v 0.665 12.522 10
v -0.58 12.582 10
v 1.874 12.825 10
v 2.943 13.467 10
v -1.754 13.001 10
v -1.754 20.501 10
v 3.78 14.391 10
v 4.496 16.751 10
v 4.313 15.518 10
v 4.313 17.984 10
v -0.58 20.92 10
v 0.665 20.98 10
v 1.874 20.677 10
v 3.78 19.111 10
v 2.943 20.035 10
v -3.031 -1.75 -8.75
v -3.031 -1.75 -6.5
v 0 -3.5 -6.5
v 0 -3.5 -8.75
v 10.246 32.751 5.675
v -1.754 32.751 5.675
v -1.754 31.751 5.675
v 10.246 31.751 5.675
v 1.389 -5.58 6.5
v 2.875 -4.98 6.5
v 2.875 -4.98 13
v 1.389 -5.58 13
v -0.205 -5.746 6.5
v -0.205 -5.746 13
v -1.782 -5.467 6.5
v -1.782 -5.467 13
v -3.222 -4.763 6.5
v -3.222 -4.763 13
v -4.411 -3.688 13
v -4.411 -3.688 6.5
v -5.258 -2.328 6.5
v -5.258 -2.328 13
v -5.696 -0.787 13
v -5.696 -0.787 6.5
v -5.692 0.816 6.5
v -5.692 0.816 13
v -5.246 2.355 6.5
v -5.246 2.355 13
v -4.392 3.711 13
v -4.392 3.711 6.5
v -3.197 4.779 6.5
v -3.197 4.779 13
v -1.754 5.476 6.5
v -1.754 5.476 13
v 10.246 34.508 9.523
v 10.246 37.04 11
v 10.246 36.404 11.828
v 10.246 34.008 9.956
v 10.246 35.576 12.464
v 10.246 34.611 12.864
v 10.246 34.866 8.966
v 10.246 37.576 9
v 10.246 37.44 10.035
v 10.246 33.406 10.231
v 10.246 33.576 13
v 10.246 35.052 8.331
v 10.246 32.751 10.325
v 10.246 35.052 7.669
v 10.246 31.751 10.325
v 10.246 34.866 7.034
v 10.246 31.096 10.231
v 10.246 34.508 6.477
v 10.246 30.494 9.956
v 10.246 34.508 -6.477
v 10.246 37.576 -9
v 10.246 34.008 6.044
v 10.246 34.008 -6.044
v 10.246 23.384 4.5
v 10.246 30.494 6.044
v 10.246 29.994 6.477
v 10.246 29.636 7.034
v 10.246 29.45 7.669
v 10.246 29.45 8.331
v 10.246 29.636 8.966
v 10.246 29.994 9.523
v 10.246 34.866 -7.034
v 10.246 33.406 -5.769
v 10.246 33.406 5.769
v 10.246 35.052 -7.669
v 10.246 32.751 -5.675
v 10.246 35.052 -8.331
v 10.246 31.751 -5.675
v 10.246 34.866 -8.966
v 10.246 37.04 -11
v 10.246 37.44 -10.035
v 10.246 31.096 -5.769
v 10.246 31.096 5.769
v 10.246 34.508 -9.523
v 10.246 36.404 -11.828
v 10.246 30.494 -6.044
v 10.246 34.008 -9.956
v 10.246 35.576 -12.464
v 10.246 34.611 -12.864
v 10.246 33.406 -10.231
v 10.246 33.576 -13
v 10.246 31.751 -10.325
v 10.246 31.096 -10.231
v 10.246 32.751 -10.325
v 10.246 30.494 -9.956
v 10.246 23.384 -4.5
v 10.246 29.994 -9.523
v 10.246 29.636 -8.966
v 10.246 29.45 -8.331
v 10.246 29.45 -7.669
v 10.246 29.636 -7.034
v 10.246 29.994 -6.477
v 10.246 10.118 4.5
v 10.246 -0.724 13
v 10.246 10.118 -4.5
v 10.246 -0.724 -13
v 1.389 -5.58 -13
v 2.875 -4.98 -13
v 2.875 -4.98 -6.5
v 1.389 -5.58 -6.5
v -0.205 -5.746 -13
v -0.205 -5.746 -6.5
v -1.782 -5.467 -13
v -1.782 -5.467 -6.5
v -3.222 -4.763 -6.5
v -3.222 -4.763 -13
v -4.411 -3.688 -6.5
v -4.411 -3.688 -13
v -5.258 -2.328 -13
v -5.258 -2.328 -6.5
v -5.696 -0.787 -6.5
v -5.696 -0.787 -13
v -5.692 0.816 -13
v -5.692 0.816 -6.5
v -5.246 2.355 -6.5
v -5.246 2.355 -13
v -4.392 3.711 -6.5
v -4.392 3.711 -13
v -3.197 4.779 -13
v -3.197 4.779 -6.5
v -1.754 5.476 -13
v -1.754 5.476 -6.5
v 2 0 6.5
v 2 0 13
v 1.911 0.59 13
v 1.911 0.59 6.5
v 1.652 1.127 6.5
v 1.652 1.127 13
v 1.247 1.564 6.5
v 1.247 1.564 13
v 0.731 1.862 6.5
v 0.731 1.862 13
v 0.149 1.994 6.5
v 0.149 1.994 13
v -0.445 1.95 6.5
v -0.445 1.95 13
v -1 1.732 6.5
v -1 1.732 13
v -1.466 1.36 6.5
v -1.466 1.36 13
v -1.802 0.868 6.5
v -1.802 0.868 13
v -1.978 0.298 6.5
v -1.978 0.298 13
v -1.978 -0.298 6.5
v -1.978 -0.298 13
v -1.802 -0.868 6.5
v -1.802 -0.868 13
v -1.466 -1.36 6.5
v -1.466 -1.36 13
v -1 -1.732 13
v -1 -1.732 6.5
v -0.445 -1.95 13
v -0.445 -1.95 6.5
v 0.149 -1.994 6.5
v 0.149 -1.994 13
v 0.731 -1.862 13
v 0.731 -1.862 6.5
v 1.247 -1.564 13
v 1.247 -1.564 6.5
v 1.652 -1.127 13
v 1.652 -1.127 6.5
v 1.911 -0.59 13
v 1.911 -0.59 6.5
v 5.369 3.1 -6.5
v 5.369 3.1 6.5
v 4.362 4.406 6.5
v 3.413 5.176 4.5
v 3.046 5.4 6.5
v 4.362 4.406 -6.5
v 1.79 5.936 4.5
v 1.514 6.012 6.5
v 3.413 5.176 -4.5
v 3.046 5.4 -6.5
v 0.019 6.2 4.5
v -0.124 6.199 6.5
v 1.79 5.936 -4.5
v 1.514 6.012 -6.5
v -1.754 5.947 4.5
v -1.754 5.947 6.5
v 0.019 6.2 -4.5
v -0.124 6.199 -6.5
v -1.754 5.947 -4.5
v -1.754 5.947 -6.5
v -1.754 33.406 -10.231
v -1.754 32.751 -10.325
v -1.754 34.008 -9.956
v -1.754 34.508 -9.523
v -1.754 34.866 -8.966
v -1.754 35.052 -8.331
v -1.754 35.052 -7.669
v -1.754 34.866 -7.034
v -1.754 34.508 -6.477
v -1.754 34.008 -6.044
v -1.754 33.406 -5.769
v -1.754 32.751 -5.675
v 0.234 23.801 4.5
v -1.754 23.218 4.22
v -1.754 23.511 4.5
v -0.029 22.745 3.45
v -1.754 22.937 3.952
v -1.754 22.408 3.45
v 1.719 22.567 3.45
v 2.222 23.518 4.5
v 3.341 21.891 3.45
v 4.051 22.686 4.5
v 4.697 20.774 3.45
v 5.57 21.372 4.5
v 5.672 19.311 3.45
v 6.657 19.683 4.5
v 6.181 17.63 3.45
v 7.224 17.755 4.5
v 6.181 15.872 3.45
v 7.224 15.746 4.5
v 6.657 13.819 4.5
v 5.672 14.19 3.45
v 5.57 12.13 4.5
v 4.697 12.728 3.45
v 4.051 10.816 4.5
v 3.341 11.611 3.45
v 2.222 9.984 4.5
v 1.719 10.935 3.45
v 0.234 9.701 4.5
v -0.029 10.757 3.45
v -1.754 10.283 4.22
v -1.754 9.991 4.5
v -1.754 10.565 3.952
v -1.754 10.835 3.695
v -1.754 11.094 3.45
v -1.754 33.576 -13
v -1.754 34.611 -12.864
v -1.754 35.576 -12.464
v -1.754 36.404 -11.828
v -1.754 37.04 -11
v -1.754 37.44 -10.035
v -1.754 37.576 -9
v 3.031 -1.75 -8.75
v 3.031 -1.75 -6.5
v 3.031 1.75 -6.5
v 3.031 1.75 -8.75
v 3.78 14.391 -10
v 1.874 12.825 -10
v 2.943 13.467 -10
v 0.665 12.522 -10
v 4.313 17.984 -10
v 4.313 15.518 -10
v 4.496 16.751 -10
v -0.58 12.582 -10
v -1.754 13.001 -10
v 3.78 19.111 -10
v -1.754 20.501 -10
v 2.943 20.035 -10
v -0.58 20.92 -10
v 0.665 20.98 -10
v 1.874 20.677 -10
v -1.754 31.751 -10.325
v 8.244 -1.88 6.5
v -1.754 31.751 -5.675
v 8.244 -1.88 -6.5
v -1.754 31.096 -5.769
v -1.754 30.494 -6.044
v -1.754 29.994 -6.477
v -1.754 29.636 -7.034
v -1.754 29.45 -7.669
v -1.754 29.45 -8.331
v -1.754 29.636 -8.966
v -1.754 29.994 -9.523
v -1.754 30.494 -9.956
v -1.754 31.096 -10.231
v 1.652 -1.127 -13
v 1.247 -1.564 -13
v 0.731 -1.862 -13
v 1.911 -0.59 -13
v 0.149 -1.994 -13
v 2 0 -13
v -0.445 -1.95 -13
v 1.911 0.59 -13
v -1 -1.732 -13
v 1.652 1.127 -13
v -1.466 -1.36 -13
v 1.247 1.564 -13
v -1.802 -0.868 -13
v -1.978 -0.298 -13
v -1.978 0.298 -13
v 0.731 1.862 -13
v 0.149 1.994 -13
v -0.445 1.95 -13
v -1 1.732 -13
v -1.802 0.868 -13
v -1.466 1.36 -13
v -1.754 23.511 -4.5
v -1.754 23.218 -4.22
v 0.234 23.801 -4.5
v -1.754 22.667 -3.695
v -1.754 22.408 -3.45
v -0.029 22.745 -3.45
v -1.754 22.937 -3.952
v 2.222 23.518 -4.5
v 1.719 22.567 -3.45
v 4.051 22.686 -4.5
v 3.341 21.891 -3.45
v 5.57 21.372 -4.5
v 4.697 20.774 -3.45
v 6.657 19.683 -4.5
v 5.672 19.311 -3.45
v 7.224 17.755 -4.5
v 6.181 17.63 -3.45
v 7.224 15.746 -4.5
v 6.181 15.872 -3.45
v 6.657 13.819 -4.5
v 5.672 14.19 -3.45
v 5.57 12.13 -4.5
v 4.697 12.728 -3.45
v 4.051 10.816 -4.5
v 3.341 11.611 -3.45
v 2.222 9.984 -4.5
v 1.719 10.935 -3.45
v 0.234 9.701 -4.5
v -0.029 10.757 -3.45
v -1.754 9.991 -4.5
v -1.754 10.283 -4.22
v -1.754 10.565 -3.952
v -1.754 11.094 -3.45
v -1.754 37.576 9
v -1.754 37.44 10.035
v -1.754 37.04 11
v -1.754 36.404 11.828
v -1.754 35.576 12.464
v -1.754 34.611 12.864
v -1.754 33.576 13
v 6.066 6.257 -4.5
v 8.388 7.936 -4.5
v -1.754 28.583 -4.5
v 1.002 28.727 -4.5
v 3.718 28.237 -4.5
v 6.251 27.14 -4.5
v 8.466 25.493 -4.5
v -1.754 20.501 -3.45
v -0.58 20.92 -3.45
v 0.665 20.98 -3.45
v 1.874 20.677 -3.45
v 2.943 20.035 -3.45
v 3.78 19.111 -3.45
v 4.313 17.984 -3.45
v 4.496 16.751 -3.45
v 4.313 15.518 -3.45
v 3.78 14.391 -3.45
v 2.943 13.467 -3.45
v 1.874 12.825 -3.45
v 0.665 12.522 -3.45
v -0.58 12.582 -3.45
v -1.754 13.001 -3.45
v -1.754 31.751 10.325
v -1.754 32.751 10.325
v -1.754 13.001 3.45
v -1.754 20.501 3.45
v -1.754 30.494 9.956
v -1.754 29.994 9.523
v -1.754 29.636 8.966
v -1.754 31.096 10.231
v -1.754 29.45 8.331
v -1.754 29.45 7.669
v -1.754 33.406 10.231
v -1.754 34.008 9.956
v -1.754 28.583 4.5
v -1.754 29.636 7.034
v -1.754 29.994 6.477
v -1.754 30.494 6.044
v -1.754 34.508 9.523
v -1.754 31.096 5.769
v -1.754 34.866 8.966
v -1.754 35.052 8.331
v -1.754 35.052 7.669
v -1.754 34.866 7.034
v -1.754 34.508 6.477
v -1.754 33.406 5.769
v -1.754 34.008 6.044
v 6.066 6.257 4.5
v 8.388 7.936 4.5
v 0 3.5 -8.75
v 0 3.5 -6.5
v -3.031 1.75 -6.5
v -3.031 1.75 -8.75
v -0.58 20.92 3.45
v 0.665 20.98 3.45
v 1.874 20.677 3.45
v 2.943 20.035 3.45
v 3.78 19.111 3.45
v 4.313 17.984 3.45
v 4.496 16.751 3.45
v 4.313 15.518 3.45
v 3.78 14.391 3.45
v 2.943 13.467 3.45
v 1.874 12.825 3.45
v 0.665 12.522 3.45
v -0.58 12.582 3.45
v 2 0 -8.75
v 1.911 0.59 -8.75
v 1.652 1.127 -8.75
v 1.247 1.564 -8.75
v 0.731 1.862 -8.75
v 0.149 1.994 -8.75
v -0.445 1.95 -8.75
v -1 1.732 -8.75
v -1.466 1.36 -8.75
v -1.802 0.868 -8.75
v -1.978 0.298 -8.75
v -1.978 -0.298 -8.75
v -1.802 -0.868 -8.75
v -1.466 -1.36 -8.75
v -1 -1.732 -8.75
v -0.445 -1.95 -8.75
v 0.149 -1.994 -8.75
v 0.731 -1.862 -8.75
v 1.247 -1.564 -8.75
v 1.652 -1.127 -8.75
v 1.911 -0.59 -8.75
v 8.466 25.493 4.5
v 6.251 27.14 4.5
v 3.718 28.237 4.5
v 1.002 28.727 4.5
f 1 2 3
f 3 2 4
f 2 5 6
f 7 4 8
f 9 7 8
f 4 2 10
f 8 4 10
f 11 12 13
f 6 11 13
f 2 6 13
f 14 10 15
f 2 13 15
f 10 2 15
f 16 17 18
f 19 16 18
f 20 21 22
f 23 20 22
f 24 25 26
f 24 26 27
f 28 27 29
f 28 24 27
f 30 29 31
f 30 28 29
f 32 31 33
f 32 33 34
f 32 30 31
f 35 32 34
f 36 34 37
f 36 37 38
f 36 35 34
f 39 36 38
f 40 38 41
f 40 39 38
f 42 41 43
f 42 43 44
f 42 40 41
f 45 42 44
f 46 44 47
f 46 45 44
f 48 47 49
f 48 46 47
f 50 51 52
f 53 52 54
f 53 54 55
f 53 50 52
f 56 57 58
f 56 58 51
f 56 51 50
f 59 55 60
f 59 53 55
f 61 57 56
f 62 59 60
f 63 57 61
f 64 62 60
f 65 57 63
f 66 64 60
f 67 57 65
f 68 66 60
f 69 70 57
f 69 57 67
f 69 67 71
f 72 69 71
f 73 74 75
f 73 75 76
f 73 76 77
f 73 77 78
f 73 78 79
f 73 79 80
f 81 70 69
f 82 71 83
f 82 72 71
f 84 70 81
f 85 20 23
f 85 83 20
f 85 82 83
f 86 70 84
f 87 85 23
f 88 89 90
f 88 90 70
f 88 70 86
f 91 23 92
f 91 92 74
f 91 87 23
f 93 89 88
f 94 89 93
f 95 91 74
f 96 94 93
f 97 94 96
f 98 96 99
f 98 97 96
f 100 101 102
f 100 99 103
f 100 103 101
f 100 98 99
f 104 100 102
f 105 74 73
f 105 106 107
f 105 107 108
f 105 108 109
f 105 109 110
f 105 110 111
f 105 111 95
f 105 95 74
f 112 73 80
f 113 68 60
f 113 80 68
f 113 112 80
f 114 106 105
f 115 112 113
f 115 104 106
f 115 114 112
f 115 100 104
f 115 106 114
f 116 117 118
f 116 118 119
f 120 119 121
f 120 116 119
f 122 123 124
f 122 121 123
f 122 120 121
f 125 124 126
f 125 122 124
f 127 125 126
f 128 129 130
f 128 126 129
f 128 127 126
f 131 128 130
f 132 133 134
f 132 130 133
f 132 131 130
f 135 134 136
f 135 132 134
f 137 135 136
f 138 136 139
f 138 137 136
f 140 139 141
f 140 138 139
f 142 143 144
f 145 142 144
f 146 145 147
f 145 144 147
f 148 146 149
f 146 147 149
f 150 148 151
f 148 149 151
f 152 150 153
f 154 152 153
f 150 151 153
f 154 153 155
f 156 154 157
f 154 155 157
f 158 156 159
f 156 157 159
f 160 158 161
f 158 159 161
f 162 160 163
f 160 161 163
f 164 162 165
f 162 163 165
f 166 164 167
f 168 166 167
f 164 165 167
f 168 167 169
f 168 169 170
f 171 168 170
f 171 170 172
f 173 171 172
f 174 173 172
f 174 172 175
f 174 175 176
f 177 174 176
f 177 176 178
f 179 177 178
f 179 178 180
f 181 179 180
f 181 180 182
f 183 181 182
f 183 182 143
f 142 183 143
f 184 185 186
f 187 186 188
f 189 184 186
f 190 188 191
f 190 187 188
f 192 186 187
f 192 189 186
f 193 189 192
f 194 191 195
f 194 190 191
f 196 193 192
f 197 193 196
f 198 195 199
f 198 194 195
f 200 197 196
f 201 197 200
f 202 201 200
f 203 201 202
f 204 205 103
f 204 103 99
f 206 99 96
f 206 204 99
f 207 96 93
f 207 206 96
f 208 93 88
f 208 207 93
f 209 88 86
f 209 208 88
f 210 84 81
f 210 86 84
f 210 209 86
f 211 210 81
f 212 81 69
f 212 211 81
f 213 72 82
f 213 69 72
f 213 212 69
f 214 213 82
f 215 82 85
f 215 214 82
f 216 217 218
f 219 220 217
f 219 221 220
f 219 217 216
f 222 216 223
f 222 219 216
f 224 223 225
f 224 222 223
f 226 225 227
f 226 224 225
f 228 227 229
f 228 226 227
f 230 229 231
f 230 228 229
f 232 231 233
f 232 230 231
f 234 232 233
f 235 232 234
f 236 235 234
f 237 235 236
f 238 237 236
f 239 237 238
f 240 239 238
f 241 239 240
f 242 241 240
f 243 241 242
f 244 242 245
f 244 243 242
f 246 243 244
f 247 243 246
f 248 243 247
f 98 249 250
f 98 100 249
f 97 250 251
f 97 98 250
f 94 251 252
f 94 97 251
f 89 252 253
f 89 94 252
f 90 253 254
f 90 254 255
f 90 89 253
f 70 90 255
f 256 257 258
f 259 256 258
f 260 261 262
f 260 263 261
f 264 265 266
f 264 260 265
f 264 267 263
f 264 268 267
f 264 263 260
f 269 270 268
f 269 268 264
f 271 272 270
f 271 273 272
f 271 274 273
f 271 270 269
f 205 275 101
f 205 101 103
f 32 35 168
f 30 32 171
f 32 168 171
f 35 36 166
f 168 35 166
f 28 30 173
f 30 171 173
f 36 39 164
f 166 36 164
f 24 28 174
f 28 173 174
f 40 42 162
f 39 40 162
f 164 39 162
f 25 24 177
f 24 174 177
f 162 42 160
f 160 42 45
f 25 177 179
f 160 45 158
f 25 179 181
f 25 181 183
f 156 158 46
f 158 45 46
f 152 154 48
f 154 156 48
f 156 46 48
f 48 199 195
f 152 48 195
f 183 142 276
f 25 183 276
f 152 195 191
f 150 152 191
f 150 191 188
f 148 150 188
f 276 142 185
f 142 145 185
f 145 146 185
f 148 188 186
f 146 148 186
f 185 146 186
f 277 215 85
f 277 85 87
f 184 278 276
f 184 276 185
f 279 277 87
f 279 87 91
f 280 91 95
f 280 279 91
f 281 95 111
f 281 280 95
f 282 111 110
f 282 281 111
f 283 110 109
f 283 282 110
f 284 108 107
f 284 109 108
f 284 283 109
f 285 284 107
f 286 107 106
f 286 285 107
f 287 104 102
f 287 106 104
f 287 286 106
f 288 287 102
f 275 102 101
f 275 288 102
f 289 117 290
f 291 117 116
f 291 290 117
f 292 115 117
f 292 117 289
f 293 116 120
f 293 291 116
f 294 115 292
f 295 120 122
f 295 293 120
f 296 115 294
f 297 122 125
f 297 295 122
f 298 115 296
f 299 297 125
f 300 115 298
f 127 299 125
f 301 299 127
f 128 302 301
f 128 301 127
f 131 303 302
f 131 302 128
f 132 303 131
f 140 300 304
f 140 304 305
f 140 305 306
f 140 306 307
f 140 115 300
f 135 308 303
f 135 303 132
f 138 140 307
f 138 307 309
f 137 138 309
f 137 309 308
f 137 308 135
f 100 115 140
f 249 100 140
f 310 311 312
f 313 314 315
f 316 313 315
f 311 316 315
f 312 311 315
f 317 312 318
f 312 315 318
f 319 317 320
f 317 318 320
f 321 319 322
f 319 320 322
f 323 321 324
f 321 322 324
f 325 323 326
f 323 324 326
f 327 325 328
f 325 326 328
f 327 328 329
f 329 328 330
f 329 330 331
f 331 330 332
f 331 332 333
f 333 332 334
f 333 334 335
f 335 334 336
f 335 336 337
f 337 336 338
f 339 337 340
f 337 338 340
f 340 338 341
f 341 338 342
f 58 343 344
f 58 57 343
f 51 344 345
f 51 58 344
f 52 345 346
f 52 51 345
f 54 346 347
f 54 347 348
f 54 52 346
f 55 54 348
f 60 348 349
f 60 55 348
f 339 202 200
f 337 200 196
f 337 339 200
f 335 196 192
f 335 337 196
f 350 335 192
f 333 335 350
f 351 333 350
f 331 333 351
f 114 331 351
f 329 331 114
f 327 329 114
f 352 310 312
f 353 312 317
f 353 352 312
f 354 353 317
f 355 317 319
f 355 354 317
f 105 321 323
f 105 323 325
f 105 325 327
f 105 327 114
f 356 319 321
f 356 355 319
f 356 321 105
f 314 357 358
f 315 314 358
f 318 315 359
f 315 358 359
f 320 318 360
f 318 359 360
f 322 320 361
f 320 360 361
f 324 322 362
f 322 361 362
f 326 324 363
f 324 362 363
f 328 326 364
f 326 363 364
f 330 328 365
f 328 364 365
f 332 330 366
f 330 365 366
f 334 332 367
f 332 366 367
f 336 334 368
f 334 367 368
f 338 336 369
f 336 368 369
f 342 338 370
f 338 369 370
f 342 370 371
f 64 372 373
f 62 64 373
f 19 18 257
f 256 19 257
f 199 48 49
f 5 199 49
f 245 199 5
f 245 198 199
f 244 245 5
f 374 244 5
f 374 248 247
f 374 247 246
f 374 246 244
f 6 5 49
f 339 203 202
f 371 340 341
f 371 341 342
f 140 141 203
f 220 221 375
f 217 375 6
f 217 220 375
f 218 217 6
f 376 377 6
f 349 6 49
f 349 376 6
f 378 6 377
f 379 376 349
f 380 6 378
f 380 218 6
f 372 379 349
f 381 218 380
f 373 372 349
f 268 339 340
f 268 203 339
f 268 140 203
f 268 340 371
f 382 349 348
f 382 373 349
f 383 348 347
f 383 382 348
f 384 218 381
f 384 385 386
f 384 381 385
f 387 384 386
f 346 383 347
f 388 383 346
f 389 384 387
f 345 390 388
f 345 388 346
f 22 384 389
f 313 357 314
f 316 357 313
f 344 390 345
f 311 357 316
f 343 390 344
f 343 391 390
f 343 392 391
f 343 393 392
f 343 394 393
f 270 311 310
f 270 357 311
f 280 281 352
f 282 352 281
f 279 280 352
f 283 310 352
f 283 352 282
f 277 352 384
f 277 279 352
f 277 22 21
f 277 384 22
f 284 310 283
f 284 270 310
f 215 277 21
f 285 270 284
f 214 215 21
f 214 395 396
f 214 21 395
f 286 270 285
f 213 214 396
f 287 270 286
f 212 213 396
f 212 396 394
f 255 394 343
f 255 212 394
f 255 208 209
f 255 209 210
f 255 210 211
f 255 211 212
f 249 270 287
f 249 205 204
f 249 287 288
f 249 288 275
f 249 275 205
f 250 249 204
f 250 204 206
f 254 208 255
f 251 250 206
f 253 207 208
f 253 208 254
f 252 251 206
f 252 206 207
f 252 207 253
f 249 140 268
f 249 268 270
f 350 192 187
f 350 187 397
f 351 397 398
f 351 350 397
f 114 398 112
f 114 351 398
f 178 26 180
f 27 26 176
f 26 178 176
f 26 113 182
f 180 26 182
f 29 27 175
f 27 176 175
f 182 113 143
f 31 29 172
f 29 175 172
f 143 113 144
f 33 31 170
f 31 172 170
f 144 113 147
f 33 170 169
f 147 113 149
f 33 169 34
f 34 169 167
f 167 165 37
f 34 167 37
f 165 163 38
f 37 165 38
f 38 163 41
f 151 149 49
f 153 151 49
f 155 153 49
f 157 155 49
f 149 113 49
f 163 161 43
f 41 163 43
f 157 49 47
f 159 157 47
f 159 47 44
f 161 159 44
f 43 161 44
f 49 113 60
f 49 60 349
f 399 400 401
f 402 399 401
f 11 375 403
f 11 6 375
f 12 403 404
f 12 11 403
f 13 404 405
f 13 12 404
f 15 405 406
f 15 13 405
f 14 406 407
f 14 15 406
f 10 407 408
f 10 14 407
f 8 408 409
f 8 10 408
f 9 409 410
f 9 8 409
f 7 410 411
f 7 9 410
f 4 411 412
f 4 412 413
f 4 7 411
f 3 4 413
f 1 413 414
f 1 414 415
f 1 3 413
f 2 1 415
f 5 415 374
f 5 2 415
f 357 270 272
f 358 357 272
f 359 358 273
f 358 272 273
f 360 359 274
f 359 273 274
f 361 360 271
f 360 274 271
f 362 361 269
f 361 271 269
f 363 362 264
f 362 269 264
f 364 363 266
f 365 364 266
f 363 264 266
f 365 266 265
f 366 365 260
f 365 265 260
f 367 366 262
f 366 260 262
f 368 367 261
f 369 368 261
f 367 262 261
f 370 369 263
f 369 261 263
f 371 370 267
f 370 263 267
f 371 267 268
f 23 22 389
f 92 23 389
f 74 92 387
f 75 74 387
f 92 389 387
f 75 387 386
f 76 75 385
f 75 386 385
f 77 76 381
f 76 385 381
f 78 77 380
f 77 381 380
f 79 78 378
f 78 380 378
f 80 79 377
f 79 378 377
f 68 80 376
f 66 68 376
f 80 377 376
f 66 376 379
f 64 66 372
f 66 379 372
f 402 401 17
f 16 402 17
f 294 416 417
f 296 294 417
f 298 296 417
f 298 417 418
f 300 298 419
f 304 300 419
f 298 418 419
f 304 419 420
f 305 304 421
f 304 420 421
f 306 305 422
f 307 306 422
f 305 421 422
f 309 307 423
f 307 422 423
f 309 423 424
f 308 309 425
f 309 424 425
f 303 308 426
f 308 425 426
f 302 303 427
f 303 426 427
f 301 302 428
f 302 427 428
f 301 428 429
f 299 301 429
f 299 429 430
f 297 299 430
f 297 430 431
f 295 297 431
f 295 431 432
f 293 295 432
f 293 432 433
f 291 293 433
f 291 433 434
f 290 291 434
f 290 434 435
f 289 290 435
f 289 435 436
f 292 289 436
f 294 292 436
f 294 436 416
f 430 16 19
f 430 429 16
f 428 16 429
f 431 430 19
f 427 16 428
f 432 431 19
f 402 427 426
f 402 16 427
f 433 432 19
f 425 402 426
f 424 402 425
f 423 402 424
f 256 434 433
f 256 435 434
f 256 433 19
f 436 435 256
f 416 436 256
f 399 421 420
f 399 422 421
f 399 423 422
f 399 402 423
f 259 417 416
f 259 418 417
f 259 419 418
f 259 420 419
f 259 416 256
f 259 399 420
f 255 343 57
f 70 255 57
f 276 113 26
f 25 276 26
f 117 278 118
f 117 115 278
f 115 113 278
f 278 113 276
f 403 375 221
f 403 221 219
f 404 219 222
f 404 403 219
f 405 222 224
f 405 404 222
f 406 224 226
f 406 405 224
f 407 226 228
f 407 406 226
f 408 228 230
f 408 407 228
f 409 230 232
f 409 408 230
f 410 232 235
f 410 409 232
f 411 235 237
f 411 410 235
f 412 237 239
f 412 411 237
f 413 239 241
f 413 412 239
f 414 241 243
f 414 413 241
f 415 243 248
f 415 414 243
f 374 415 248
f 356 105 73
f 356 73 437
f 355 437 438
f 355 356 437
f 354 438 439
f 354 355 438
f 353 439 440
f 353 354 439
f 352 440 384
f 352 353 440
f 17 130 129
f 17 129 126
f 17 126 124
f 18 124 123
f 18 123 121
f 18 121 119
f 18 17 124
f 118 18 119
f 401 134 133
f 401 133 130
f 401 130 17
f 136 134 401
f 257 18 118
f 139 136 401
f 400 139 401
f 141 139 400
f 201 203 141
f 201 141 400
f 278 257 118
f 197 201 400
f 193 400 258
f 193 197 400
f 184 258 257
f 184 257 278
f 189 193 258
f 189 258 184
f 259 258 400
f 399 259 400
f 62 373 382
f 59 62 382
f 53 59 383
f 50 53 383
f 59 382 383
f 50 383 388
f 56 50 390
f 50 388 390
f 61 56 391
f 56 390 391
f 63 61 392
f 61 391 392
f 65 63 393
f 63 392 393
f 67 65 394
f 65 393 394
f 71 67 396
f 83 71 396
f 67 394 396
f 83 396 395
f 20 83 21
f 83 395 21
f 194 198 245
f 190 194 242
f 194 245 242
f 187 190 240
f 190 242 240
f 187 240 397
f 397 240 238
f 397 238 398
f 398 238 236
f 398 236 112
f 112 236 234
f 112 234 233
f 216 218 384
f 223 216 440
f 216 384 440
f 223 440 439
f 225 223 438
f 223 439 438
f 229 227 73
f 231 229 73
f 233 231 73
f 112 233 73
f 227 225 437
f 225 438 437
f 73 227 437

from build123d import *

# Parameters (mm, degrees)
BOSS_EXTRUDE1_DEPTH      = 13
BOSS_EXTRUDE1_DEPTH_BACK = 13
CUT_EXTRUDE1_DEPTH       = 6.5
CUT_EXTRUDE1_DEPTH_BACK  = 6.5
CUT_EXTRUDE3_DEPTH       = 4.5
CUT_EXTRUDE3_DEPTH_BACK  = 4.5
SKETCH3_R                = 12
CUT_EXTRUDE4_DEPTH       = 10
CUT_EXTRUDE4_DEPTH_BACK  = 10
SKETCH4_R                = 4.25
SKETCH5_R                = 2
CUT_EXTRUDE5_DEPTH       = 47.828649116
SKETCH9_W                = 5.05
SKETCH9_H                = 13.520724833
CUT_EXTRUDE8_DEPTH       = 43.698622671
CUT_EXTRUDE9_DEPTH       = 42.532474067
FILLET1_R                = 4
CUT_EXTRUDE10_DEPTH      = 2.25


with BuildPart() as part:
    # Sketch1 → Boss-Extrude1 (new, two sides: drawn at the far end of the back side and taken through both)
    with BuildSketch(Plane.XY.offset(-BOSS_EXTRUDE1_DEPTH_BACK)):
        with BuildLine():
            Line((-1.754221061, 5.475875133), (-1.754221061, 37.575875133))
            Line((-1.754221061, 37.575875133), (10.245778939, 37.575875133))
            Line((10.245778939, 37.575875133), (10.245778939, -0.724124867))
            Line((10.245778939, -0.724124867), (2.875, -4.979646072))
            ThreePointArc((2.875, -4.979646072), (-5.257710269, -2.327870857), (-1.754221061, 5.475875133))
        make_face()
    extrude(amount=BOSS_EXTRUDE1_DEPTH + BOSS_EXTRUDE1_DEPTH_BACK)

    # Sketch2 → Cut-Extrude1 (cut, two sides: drawn at the far end of the back side and taken through both)
    with BuildSketch(Plane.XY.offset(-CUT_EXTRUDE1_DEPTH_BACK)):
        with BuildLine():
            Line((8.244357503, -1.879646072), (5.369357503, 3.1))
            ThreePointArc((5.369357503, 3.1), (2.300687806, 5.757328862), (-1.754221061, 5.946655234))
            Line((-1.754221061, 5.946655234), (-5.75, 5.946655234))
            Line((-5.75, 5.946655234), (-5.75, -5.75))
            Line((-5.75, -5.75), (8.244357503, -5.75))
            Line((8.244357503, -5.75), (8.244357503, -1.879646072))
        make_face()
    extrude(amount=CUT_EXTRUDE1_DEPTH + CUT_EXTRUDE1_DEPTH_BACK, mode=Mode.SUBTRACT)

    # Sketch3 → Cut-Extrude3 (cut, two sides: drawn at the far end of the back side and taken through both)
    with BuildSketch(Plane.XY.offset(-CUT_EXTRUDE3_DEPTH_BACK)):
        with Locations((0.245778939, 16.750875133)):
            Circle(SKETCH3_R)
    extrude(amount=CUT_EXTRUDE3_DEPTH + CUT_EXTRUDE3_DEPTH_BACK, mode=Mode.SUBTRACT)

    # Sketch4 → Cut-Extrude4 (cut, two sides: drawn at the far end of the back side and taken through both)
    with BuildSketch(Plane.XY.offset(-CUT_EXTRUDE4_DEPTH_BACK)):
        with Locations((0.245778939, 16.750875133)):
            Circle(SKETCH4_R)
    extrude(amount=CUT_EXTRUDE4_DEPTH + CUT_EXTRUDE4_DEPTH_BACK, mode=Mode.SUBTRACT)

    # Sketch5 → Cut-Extrude5 (cut, through all)
    with BuildSketch(Plane.XY.offset(13)):
        Circle(SKETCH5_R)
    extrude(amount=-CUT_EXTRUDE5_DEPTH, mode=Mode.SUBTRACT)

    # Sweep4: sweep along a path in Sketch8
    with BuildLine(Plane(origin=(0, 0, 4.5), x_dir=(-1, 0, 0), z_dir=(0, 0, -1))) as sweep4_path:
        CenterArc((-0.245778939, 16.750875133), 4.25, 0, 360)
    # 3DSketch3 → Sweep4 (sweep)
    with BuildSketch(Plane(origin=(4.495778939, 16.750875133, 4.5), x_dir=(1, 0, 0), z_dir=(0, 1, 0))):
        Polygon((0, 0), (2.8, 0), (1.75, 1.05), (0, 1.05), align=None)
    sweep4 = sweep(path=sweep4_path.line)

    # Mirror10: Sweep4 across plane
    add(sweep4.mirror(Plane.XY))

    # Sketch9 → Cut-Extrude8 (cut, through all)
    with BuildSketch(Plane(origin=(0, 0, 4.5), x_dir=(-1, 0, 0), z_dir=(0, 0, -1))):
        with Locations((4.279221061, 16.750875132)):
            Rectangle(SKETCH9_W, SKETCH9_H)
    extrude(amount=CUT_EXTRUDE8_DEPTH, mode=Mode.SUBTRACT)

    # Sketch10 → Cut-Extrude9 (cut, through all)
    with BuildSketch(Plane.ZY.offset(1.754221061)):
        with BuildLine():
            Line((-5.675, 32.750875133), (-5.675, 31.750875133))
            ThreePointArc((-5.675, 31.750875133), (-8, 29.425875133), (-10.325, 31.750875133))
            Line((-10.325, 31.750875133), (-10.325, 32.750875133))
            ThreePointArc((-10.325, 32.750875133), (-8, 35.075875133), (-5.675, 32.750875133))
        make_face()
        with BuildLine():
            Line((5.675, 32.750875133), (5.675, 31.750875133))
            ThreePointArc((5.675, 31.750875133), (8, 29.425875133), (10.325, 31.750875133))
            Line((10.325, 31.750875133), (10.325, 32.750875133))
            ThreePointArc((10.325, 32.750875133), (8, 35.075875133), (5.675, 32.750875133))
        make_face()
    extrude(amount=-CUT_EXTRUDE9_DEPTH, mode=Mode.SUBTRACT)

    # Fillet1
    fillet1_edges = [part.edges().sort_by_distance(p)[0] for p in [
        (4.245778939, 37.575875133, -13),
        (4.245778939, 37.575875133, 13),
    ]]
    fillet(fillet1_edges, radius=FILLET1_R)

    # Sketch11 → Cut-Extrude10 (cut)
    with BuildSketch(Plane.XY.offset(-6.5)):
        Polygon((0, 3.5), (-3.031088913, 1.75), (-3.031088913, -1.75), (0, -3.5), (3.031088913, -1.75), (3.031088913, 1.75), align=None)
    extrude(amount=-CUT_EXTRUDE10_DEPTH, mode=Mode.SUBTRACT)


solid = part.part
